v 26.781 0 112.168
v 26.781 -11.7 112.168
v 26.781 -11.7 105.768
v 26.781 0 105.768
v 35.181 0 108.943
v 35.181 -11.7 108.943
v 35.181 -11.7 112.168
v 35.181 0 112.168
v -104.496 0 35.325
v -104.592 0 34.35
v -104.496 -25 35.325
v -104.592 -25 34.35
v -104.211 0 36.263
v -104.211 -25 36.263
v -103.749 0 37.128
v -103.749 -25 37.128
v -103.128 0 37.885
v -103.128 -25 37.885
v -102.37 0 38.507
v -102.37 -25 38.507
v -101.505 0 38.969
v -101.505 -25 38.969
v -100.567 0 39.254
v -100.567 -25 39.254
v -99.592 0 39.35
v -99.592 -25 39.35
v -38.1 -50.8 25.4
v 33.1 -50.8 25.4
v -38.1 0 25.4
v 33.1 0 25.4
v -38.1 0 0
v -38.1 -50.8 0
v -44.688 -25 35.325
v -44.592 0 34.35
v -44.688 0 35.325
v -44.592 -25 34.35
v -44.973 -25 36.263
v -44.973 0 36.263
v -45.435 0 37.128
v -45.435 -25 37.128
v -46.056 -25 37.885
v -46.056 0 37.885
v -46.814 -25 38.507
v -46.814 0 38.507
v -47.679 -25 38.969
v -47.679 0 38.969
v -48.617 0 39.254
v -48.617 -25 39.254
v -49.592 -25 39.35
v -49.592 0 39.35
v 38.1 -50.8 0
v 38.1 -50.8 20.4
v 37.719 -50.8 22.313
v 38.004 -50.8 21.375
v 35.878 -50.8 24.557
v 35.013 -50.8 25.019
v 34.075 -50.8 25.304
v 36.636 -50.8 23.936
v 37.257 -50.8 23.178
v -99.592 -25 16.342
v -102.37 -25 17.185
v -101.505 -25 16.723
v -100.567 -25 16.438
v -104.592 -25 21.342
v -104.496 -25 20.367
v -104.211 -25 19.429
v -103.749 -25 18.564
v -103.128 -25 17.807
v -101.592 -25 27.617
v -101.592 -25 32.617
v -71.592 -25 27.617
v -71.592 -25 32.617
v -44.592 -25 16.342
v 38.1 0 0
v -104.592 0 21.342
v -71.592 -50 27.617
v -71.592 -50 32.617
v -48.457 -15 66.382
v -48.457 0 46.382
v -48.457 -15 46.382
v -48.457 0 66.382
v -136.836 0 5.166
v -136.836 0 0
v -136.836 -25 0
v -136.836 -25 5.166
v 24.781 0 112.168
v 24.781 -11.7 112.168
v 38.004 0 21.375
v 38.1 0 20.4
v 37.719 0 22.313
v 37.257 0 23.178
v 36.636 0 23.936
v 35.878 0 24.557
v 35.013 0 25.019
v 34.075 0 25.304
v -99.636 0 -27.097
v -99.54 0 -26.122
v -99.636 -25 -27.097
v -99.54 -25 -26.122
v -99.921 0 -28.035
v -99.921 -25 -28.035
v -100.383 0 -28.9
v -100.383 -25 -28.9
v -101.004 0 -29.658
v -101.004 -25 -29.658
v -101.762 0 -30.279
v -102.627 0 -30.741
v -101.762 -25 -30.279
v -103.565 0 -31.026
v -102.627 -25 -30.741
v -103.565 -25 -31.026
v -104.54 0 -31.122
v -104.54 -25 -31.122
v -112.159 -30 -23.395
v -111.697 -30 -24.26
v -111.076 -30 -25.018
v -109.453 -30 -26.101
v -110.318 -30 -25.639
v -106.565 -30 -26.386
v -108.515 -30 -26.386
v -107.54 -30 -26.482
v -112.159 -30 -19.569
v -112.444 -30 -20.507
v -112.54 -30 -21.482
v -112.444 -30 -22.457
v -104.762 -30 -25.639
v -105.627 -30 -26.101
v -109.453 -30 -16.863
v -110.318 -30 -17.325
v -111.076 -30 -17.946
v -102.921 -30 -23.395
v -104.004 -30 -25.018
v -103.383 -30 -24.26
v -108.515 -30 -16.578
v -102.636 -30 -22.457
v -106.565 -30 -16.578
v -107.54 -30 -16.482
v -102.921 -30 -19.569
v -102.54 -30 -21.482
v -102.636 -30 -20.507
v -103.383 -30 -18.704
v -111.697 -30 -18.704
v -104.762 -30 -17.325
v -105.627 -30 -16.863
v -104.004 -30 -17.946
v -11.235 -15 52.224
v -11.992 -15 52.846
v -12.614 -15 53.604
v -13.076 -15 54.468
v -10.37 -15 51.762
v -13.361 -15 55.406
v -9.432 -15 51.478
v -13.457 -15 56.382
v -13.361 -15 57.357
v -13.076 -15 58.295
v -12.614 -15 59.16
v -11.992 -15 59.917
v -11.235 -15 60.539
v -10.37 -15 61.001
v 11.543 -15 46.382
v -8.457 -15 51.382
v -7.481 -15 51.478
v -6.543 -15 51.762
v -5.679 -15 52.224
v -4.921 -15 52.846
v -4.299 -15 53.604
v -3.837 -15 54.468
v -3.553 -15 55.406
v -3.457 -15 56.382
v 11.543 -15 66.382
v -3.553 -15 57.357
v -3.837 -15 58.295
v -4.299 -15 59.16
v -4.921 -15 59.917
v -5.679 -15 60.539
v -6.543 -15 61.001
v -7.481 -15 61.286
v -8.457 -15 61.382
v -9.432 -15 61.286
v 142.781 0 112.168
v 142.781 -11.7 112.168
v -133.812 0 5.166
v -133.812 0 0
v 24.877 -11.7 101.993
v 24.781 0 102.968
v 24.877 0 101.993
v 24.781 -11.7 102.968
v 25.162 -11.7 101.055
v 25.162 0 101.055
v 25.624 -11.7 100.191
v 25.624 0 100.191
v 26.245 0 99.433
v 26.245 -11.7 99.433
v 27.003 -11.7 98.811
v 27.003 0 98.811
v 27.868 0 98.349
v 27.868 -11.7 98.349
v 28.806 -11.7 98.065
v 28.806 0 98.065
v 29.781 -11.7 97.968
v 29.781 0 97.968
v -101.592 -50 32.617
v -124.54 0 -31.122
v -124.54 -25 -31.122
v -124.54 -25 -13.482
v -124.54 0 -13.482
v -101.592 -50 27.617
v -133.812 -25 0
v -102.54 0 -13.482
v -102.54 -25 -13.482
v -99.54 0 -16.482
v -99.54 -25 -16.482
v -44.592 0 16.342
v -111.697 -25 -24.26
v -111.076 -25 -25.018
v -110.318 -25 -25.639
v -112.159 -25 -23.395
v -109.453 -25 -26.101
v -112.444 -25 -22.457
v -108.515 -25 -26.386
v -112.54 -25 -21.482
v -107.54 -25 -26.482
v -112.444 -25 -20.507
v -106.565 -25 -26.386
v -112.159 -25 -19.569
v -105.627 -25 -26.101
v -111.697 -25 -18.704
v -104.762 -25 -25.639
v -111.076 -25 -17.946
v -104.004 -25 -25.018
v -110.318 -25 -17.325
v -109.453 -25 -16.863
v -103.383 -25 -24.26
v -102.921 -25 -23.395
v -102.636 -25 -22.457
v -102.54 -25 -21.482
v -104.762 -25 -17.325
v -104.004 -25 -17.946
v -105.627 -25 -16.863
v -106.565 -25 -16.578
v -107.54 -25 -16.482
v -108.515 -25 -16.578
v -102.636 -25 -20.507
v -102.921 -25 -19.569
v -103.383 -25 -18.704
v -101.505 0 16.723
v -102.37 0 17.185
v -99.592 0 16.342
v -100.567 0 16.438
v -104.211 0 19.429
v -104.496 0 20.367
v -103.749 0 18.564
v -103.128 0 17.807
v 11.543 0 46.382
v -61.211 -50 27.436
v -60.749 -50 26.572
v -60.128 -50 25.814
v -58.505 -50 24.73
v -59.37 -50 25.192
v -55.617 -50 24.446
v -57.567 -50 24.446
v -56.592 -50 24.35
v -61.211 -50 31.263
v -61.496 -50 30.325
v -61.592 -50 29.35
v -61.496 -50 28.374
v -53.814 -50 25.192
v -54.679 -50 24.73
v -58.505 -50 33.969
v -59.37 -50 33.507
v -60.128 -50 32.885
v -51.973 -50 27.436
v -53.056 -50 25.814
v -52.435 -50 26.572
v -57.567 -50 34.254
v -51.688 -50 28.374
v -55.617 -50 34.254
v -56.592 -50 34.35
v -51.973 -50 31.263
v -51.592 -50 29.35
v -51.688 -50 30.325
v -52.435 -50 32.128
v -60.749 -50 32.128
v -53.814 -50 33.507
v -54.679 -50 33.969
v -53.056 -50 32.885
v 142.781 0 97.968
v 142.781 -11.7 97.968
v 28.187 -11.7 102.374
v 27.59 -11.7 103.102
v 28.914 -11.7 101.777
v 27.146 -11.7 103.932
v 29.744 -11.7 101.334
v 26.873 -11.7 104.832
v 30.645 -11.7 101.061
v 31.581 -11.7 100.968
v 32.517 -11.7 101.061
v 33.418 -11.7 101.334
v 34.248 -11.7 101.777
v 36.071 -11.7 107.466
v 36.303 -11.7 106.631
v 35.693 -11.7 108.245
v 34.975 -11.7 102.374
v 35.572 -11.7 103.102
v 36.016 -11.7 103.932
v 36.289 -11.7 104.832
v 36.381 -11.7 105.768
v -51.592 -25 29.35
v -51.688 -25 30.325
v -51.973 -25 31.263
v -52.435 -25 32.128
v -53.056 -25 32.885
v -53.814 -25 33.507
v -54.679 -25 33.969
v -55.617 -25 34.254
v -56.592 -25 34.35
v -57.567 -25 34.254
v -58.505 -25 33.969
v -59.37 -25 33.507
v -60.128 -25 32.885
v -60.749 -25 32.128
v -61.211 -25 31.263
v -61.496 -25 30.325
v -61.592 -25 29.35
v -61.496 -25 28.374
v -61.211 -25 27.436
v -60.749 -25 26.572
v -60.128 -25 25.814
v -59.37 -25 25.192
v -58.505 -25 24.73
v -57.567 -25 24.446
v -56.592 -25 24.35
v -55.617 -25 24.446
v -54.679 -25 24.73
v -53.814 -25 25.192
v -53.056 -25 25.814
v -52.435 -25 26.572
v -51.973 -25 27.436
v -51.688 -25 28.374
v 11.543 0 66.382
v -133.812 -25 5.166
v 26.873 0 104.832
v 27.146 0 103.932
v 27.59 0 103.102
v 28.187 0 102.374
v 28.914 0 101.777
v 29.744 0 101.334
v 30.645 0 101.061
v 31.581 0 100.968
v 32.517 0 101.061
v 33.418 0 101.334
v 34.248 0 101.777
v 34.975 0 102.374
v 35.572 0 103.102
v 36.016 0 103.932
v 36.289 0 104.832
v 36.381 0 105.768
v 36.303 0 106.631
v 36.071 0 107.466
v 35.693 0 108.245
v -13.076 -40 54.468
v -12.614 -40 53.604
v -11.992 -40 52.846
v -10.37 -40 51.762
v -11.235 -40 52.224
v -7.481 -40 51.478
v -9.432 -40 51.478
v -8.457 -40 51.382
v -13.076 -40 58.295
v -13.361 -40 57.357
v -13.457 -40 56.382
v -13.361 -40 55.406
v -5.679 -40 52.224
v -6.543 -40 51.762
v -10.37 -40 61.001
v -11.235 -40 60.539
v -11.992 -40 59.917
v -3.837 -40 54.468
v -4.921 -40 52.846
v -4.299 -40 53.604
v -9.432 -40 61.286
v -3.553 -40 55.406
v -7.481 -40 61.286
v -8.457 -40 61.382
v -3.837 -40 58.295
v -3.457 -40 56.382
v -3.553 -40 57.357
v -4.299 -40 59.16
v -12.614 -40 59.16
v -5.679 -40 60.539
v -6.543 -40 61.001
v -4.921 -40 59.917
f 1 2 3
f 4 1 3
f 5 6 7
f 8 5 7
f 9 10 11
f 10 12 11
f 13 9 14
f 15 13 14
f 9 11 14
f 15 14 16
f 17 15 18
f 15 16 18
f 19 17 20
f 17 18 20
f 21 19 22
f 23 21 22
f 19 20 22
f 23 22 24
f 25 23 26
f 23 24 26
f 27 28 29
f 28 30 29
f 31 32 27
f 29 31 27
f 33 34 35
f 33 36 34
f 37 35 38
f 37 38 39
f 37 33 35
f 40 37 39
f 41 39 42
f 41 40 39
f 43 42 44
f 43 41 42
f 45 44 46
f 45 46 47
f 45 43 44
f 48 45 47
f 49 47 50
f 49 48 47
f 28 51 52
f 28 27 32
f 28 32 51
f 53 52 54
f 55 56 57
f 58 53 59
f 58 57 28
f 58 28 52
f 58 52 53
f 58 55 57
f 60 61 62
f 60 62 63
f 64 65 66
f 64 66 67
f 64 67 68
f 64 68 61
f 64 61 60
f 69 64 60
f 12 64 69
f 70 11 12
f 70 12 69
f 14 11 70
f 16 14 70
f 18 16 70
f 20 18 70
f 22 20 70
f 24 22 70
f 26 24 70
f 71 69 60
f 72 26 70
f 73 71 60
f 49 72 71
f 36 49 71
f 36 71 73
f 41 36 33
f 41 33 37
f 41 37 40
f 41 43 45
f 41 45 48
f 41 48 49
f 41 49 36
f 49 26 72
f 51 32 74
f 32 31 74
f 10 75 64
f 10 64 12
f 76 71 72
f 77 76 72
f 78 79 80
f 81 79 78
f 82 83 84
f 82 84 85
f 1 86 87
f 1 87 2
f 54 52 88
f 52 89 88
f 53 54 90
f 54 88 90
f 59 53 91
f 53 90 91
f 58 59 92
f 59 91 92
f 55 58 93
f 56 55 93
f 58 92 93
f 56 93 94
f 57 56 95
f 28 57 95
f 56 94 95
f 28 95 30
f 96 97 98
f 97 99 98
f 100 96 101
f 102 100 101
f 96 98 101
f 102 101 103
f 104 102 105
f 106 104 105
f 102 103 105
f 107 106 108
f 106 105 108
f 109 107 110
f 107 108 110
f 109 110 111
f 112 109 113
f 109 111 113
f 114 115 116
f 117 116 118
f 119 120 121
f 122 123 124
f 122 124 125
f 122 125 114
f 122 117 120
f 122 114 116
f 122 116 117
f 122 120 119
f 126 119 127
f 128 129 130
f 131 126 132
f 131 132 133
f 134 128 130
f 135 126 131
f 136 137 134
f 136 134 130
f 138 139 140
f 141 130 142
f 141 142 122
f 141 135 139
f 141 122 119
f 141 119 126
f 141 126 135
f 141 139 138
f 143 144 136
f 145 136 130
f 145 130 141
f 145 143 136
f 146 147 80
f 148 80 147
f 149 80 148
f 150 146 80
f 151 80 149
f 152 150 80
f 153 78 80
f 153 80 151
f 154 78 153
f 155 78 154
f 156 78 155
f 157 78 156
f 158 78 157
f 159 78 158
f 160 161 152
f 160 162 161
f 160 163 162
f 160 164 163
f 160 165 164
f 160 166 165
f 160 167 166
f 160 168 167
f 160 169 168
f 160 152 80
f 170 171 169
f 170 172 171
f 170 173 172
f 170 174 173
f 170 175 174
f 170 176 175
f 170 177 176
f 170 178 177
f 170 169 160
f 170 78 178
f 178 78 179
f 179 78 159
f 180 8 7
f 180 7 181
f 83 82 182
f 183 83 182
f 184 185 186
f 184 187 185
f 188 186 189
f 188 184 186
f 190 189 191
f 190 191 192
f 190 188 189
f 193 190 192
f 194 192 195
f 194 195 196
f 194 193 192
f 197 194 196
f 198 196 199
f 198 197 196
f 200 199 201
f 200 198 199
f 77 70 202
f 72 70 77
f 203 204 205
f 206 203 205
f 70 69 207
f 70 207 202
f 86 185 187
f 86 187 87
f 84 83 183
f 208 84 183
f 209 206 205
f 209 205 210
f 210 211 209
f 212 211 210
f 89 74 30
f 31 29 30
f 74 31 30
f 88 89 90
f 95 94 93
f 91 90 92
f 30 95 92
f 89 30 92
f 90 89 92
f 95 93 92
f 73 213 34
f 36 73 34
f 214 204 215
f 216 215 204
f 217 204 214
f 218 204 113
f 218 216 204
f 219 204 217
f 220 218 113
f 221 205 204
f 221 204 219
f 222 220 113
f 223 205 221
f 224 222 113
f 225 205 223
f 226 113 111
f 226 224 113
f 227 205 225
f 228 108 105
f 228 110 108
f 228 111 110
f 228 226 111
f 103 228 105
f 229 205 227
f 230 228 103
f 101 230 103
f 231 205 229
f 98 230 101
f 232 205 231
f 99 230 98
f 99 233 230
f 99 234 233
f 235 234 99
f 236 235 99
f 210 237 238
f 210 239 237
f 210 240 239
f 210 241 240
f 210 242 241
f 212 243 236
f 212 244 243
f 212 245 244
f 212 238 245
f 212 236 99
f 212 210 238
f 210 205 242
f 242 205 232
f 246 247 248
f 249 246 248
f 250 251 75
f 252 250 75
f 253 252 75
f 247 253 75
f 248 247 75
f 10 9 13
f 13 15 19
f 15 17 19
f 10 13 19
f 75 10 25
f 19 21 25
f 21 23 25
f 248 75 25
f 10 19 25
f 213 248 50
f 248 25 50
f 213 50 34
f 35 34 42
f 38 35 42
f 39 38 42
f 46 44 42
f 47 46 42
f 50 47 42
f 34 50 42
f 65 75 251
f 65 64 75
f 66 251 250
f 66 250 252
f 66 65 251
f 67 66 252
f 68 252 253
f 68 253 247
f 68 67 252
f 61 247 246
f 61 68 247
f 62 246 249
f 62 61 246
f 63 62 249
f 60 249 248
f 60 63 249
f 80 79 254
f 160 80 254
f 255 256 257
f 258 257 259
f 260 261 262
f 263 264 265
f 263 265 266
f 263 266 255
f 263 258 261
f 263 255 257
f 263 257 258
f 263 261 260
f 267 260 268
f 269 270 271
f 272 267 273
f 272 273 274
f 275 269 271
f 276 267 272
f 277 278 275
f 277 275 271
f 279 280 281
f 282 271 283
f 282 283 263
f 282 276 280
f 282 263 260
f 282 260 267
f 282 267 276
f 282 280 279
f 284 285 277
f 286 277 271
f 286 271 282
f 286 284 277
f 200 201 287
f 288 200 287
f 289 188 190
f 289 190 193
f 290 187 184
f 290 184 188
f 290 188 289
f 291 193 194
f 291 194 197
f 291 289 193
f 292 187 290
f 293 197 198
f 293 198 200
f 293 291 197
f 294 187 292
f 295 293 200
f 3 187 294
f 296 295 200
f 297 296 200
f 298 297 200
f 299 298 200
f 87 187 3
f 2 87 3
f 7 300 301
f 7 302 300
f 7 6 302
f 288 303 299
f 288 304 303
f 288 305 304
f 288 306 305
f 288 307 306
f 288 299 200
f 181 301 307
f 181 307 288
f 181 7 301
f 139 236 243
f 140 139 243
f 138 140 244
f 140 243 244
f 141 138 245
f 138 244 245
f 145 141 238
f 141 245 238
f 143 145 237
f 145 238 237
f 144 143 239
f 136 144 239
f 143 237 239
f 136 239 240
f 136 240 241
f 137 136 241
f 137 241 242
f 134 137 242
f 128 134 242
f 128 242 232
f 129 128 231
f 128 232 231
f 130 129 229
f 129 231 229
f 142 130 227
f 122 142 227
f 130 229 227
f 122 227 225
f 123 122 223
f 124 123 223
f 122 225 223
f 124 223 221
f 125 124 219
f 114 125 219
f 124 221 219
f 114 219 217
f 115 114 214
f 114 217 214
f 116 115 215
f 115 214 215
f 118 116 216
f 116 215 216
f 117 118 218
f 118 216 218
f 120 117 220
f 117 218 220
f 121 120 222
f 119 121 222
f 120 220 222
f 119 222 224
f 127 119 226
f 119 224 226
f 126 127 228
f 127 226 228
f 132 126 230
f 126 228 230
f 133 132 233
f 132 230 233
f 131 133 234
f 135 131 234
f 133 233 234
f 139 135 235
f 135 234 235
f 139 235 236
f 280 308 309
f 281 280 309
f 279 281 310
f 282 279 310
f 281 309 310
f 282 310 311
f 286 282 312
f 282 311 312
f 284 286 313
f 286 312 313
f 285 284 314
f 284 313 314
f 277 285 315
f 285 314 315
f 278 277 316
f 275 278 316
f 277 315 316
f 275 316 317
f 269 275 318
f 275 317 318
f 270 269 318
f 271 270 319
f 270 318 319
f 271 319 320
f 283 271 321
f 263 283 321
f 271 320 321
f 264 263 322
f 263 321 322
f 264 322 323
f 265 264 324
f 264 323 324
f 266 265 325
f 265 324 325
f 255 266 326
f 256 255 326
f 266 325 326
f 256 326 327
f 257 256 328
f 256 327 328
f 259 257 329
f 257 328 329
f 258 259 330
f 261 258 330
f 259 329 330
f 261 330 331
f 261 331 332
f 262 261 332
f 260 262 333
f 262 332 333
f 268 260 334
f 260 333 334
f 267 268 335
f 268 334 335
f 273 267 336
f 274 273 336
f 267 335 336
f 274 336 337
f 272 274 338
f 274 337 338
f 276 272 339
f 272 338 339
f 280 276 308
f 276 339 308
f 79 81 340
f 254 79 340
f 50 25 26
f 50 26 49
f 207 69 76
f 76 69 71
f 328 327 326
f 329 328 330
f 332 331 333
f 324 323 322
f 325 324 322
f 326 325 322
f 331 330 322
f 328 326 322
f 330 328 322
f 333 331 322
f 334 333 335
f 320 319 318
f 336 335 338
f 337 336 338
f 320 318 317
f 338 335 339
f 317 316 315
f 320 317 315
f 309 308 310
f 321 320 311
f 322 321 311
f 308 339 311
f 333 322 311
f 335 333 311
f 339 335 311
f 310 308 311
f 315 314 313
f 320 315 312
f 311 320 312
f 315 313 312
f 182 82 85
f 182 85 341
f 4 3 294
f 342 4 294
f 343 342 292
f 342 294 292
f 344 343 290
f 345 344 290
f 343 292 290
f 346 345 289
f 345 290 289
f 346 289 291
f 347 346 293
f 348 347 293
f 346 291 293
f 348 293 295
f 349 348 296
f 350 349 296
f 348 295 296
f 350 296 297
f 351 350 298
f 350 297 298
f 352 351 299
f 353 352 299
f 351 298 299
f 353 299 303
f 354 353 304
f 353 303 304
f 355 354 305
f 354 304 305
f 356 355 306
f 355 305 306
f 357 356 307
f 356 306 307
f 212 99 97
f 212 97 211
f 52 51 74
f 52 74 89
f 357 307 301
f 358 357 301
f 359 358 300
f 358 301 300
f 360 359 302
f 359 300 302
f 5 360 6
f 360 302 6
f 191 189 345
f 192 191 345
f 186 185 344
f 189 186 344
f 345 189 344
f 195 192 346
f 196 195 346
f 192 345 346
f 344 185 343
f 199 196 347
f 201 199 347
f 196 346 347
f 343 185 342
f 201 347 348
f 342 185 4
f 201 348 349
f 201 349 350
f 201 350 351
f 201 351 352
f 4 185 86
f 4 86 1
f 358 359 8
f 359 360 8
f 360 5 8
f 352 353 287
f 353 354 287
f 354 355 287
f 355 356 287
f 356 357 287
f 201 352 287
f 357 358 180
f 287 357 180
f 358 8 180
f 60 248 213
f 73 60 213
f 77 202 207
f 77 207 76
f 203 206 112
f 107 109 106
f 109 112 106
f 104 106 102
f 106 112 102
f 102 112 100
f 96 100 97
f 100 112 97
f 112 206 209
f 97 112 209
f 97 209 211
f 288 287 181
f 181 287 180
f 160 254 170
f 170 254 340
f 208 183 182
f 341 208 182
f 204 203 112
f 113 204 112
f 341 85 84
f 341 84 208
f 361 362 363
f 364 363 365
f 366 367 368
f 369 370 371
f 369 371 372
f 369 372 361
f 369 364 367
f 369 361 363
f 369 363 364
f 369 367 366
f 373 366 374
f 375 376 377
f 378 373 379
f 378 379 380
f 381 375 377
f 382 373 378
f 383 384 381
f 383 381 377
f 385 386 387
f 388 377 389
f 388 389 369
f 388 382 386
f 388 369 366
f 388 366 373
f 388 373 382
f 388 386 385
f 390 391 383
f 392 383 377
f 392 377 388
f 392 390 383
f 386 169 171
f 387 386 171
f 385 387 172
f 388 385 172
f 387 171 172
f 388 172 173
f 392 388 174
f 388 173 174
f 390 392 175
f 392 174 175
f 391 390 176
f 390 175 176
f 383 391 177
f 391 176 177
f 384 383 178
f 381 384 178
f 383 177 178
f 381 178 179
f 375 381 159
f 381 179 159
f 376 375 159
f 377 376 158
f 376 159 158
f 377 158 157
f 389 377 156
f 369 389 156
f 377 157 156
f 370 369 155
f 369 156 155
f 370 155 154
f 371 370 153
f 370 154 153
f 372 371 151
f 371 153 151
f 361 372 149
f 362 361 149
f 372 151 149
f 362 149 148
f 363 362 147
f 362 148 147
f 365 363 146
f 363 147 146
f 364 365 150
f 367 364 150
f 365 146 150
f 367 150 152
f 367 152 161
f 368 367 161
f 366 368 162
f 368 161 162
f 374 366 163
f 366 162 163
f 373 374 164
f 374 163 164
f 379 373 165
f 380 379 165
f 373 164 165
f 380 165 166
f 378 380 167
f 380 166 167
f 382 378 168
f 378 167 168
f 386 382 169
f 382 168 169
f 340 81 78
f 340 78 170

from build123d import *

# Parameters (mm, degrees)
F0_W      = 38.1
F0_H      = 25.4
F1_DEPTH  = 25.4
F3_DEPTH  = 25.4
F5_W      = 60
F5_H      = 20
F6_DEPTH  = 15
F7_R      = 5
F8_DEPTH  = 25
F9_W      = 60
F9_H      = 23.0075153246
F10_DEPTH = 25
F9_W_2    = 3.0239969492
F9_H_2    = 5.1660002209
F9_W_3    = 25
F9_H_3    = 17.6400020719
F11_R     = 5
F13_W     = 30
F13_H     = 5
F14_DEPTH = 25
F15_R     = 5
F16_DEPTH = 5
F17_SIZE  = 3
F18_R     = 5
F19_R     = 5
F20_DEPTH = 25
F21_R     = 5
F22_W     = 118
F22_H     = 14.2
F23_DEPTH = 11.7
F25_DEPTH = 25
F26_R     = 5


# Not quite as in the source:
# - the program builds the solid bodies; features that only make, move or delete a surface that nothing else refers to are left out


with BuildPart() as f1:
    # F0 (on Front) → F1 (new body)
    with BuildSketch(Plane.XZ):
        with Locations((-19.05, 12.7)):
            Rectangle(F0_W, F0_H)
        with Locations((19.05, 12.7)):
            Rectangle(F0_W, F0_H)
    extrude(amount=F1_DEPTH)

    # F3 (add): a face of the model
    f3_faces = [f1.faces().sort_by_distance(p)[0] for p in [
        (0, -25.4, 12.7),
    ]]
    extrude(f3_faces, amount=F3_DEPTH)

    # F21
    f21_edges = [f1.edges().sort_by_distance(p)[0] for p in [
        (38.1, -25.4, 25.4),
    ]]
    fillet(f21_edges, radius=F21_R)


with BuildPart() as f6:
    # F5 (on Front) → F6 (new body)
    with BuildSketch(Plane.XZ):
        with Locations((-18.4568141215, 56.381771341)):
            Rectangle(F5_W, F5_H)
    extrude(amount=F6_DEPTH)

    # F7 (on face) → F8 (join)
    with BuildSketch(Plane.XZ.offset(15)):
        with Locations((-8.4568141215, 56.381771341)):
            Circle(F7_R)
    extrude(amount=F8_DEPTH)


with BuildPart() as f10:
    # F9 (on Front) → F10 (new body)
    with BuildSketch(Plane.XZ):
        with Locations((-74.5920035988, 27.8460001573)):
            Rectangle(F9_W, F9_H)
    extrude(amount=F10_DEPTH)

    # F11
    f11_edges = [f10.edges().sort_by_distance(p)[0] for p in [
        (-104.592004, -12.5, 39.349758),
        (-104.592004, -12.5, 16.342242),
        (-44.592004, -12.5, 39.349758),
    ]]
    fillet(f11_edges, radius=F11_R)

    # F13 (on face) → F14 (join)
    with BuildSketch(Plane.XZ.offset(25)):
        with Locations((-86.5920035988, 30.1169776731)):
            Rectangle(F13_W, F13_H)
    extrude(amount=F14_DEPTH)


with BuildPart() as f10b:
    # F9 (on Front) → F10, piece 2 (new body)
    with BuildSketch(Plane.XZ):
        with Locations((-135.3240087628, 2.5830001105)):
            Rectangle(F9_W_2, F9_H_2)
    extrude(amount=F10_DEPTH)


with BuildPart() as f10c:
    # F9 (on Front) → F10, piece 3 (new body)
    with BuildSketch(Plane.XZ):
        with Locations((-112.0400026441, -22.3020017147)):
            Rectangle(F9_W_3, F9_H_3)
    extrude(amount=F10_DEPTH)

    # F15 (on face) → F16 (join)
    with BuildSketch(Plane.XZ.offset(25)):
        with Locations((-107.5400026441, -21.4820006788)):
            Circle(F15_R)
    extrude(amount=F16_DEPTH)

    # F17
    f17_edges = [f10c.edges().sort_by_distance(p)[0] for p in [
        (-99.540003, -12.5, -13.482001),
    ]]
    chamfer(f17_edges, length=F17_SIZE)

    # F18
    f18_edges = [f10c.edges().sort_by_distance(p)[0] for p in [
        (-99.540003, -12.5, -31.122003),
    ]]
    fillet(f18_edges, radius=F18_R)


with BuildPart() as f20:
    # F19 (on face) → F20 (new body)
    with BuildSketch(Plane.XZ.offset(25)):
        with Locations((-56.5920035988, 29.3497578196)):
            Circle(F19_R)
    extrude(amount=F20_DEPTH)


with BuildPart() as f23:
    # F22 (on Front) → F23 (new body)
    with BuildSketch(Plane.XZ):
        with Locations((83.7810058147, 105.068490946)):
            Rectangle(F22_W, F22_H)
    extrude(amount=F23_DEPTH)

    # F24 (on face) → F25 (cut)
    with BuildSketch(Plane.XZ.offset(11.7)):
        with BuildLine():
            ThreePointArc((26.7810058147, 105.768490946), (31.5810058147, 100.968490946), (36.3810058147, 105.768490946))
            ThreePointArc((36.3810058147, 105.768490946), (36.0709946788, 107.4655472209), (35.1810058147, 108.9433925193))
            ThreePointArc((35.1810058147, 108.9433925193), (29.8839495398, 110.2584798102), (26.7810058147, 105.768490946))
        make_face()
        with BuildLine():
            ThreePointArc((26.7810058147, 105.768490946), (29.8839495398, 110.2584798102), (35.1810058147, 108.9433925193))
            Line((35.1810058147, 108.9433925193), (35.1810058147, 112.168490946))
            Line((35.1810058147, 112.168490946), (26.7810058147, 112.168490946))
            Line((26.7810058147, 112.168490946), (26.7810058147, 105.768490946))
        make_face()
    extrude(amount=-F25_DEPTH, mode=Mode.SUBTRACT)

    # F26
    f26_edges = [f23.edges().sort_by_distance(p)[0] for p in [
        (24.781006, -5.85, 97.968491),
    ]]
    fillet(f26_edges, radius=F26_R)


solid = Compound([f1.part, f6.part, f10.part, f10b.part, f10c.part, f20.part, f23.part])
